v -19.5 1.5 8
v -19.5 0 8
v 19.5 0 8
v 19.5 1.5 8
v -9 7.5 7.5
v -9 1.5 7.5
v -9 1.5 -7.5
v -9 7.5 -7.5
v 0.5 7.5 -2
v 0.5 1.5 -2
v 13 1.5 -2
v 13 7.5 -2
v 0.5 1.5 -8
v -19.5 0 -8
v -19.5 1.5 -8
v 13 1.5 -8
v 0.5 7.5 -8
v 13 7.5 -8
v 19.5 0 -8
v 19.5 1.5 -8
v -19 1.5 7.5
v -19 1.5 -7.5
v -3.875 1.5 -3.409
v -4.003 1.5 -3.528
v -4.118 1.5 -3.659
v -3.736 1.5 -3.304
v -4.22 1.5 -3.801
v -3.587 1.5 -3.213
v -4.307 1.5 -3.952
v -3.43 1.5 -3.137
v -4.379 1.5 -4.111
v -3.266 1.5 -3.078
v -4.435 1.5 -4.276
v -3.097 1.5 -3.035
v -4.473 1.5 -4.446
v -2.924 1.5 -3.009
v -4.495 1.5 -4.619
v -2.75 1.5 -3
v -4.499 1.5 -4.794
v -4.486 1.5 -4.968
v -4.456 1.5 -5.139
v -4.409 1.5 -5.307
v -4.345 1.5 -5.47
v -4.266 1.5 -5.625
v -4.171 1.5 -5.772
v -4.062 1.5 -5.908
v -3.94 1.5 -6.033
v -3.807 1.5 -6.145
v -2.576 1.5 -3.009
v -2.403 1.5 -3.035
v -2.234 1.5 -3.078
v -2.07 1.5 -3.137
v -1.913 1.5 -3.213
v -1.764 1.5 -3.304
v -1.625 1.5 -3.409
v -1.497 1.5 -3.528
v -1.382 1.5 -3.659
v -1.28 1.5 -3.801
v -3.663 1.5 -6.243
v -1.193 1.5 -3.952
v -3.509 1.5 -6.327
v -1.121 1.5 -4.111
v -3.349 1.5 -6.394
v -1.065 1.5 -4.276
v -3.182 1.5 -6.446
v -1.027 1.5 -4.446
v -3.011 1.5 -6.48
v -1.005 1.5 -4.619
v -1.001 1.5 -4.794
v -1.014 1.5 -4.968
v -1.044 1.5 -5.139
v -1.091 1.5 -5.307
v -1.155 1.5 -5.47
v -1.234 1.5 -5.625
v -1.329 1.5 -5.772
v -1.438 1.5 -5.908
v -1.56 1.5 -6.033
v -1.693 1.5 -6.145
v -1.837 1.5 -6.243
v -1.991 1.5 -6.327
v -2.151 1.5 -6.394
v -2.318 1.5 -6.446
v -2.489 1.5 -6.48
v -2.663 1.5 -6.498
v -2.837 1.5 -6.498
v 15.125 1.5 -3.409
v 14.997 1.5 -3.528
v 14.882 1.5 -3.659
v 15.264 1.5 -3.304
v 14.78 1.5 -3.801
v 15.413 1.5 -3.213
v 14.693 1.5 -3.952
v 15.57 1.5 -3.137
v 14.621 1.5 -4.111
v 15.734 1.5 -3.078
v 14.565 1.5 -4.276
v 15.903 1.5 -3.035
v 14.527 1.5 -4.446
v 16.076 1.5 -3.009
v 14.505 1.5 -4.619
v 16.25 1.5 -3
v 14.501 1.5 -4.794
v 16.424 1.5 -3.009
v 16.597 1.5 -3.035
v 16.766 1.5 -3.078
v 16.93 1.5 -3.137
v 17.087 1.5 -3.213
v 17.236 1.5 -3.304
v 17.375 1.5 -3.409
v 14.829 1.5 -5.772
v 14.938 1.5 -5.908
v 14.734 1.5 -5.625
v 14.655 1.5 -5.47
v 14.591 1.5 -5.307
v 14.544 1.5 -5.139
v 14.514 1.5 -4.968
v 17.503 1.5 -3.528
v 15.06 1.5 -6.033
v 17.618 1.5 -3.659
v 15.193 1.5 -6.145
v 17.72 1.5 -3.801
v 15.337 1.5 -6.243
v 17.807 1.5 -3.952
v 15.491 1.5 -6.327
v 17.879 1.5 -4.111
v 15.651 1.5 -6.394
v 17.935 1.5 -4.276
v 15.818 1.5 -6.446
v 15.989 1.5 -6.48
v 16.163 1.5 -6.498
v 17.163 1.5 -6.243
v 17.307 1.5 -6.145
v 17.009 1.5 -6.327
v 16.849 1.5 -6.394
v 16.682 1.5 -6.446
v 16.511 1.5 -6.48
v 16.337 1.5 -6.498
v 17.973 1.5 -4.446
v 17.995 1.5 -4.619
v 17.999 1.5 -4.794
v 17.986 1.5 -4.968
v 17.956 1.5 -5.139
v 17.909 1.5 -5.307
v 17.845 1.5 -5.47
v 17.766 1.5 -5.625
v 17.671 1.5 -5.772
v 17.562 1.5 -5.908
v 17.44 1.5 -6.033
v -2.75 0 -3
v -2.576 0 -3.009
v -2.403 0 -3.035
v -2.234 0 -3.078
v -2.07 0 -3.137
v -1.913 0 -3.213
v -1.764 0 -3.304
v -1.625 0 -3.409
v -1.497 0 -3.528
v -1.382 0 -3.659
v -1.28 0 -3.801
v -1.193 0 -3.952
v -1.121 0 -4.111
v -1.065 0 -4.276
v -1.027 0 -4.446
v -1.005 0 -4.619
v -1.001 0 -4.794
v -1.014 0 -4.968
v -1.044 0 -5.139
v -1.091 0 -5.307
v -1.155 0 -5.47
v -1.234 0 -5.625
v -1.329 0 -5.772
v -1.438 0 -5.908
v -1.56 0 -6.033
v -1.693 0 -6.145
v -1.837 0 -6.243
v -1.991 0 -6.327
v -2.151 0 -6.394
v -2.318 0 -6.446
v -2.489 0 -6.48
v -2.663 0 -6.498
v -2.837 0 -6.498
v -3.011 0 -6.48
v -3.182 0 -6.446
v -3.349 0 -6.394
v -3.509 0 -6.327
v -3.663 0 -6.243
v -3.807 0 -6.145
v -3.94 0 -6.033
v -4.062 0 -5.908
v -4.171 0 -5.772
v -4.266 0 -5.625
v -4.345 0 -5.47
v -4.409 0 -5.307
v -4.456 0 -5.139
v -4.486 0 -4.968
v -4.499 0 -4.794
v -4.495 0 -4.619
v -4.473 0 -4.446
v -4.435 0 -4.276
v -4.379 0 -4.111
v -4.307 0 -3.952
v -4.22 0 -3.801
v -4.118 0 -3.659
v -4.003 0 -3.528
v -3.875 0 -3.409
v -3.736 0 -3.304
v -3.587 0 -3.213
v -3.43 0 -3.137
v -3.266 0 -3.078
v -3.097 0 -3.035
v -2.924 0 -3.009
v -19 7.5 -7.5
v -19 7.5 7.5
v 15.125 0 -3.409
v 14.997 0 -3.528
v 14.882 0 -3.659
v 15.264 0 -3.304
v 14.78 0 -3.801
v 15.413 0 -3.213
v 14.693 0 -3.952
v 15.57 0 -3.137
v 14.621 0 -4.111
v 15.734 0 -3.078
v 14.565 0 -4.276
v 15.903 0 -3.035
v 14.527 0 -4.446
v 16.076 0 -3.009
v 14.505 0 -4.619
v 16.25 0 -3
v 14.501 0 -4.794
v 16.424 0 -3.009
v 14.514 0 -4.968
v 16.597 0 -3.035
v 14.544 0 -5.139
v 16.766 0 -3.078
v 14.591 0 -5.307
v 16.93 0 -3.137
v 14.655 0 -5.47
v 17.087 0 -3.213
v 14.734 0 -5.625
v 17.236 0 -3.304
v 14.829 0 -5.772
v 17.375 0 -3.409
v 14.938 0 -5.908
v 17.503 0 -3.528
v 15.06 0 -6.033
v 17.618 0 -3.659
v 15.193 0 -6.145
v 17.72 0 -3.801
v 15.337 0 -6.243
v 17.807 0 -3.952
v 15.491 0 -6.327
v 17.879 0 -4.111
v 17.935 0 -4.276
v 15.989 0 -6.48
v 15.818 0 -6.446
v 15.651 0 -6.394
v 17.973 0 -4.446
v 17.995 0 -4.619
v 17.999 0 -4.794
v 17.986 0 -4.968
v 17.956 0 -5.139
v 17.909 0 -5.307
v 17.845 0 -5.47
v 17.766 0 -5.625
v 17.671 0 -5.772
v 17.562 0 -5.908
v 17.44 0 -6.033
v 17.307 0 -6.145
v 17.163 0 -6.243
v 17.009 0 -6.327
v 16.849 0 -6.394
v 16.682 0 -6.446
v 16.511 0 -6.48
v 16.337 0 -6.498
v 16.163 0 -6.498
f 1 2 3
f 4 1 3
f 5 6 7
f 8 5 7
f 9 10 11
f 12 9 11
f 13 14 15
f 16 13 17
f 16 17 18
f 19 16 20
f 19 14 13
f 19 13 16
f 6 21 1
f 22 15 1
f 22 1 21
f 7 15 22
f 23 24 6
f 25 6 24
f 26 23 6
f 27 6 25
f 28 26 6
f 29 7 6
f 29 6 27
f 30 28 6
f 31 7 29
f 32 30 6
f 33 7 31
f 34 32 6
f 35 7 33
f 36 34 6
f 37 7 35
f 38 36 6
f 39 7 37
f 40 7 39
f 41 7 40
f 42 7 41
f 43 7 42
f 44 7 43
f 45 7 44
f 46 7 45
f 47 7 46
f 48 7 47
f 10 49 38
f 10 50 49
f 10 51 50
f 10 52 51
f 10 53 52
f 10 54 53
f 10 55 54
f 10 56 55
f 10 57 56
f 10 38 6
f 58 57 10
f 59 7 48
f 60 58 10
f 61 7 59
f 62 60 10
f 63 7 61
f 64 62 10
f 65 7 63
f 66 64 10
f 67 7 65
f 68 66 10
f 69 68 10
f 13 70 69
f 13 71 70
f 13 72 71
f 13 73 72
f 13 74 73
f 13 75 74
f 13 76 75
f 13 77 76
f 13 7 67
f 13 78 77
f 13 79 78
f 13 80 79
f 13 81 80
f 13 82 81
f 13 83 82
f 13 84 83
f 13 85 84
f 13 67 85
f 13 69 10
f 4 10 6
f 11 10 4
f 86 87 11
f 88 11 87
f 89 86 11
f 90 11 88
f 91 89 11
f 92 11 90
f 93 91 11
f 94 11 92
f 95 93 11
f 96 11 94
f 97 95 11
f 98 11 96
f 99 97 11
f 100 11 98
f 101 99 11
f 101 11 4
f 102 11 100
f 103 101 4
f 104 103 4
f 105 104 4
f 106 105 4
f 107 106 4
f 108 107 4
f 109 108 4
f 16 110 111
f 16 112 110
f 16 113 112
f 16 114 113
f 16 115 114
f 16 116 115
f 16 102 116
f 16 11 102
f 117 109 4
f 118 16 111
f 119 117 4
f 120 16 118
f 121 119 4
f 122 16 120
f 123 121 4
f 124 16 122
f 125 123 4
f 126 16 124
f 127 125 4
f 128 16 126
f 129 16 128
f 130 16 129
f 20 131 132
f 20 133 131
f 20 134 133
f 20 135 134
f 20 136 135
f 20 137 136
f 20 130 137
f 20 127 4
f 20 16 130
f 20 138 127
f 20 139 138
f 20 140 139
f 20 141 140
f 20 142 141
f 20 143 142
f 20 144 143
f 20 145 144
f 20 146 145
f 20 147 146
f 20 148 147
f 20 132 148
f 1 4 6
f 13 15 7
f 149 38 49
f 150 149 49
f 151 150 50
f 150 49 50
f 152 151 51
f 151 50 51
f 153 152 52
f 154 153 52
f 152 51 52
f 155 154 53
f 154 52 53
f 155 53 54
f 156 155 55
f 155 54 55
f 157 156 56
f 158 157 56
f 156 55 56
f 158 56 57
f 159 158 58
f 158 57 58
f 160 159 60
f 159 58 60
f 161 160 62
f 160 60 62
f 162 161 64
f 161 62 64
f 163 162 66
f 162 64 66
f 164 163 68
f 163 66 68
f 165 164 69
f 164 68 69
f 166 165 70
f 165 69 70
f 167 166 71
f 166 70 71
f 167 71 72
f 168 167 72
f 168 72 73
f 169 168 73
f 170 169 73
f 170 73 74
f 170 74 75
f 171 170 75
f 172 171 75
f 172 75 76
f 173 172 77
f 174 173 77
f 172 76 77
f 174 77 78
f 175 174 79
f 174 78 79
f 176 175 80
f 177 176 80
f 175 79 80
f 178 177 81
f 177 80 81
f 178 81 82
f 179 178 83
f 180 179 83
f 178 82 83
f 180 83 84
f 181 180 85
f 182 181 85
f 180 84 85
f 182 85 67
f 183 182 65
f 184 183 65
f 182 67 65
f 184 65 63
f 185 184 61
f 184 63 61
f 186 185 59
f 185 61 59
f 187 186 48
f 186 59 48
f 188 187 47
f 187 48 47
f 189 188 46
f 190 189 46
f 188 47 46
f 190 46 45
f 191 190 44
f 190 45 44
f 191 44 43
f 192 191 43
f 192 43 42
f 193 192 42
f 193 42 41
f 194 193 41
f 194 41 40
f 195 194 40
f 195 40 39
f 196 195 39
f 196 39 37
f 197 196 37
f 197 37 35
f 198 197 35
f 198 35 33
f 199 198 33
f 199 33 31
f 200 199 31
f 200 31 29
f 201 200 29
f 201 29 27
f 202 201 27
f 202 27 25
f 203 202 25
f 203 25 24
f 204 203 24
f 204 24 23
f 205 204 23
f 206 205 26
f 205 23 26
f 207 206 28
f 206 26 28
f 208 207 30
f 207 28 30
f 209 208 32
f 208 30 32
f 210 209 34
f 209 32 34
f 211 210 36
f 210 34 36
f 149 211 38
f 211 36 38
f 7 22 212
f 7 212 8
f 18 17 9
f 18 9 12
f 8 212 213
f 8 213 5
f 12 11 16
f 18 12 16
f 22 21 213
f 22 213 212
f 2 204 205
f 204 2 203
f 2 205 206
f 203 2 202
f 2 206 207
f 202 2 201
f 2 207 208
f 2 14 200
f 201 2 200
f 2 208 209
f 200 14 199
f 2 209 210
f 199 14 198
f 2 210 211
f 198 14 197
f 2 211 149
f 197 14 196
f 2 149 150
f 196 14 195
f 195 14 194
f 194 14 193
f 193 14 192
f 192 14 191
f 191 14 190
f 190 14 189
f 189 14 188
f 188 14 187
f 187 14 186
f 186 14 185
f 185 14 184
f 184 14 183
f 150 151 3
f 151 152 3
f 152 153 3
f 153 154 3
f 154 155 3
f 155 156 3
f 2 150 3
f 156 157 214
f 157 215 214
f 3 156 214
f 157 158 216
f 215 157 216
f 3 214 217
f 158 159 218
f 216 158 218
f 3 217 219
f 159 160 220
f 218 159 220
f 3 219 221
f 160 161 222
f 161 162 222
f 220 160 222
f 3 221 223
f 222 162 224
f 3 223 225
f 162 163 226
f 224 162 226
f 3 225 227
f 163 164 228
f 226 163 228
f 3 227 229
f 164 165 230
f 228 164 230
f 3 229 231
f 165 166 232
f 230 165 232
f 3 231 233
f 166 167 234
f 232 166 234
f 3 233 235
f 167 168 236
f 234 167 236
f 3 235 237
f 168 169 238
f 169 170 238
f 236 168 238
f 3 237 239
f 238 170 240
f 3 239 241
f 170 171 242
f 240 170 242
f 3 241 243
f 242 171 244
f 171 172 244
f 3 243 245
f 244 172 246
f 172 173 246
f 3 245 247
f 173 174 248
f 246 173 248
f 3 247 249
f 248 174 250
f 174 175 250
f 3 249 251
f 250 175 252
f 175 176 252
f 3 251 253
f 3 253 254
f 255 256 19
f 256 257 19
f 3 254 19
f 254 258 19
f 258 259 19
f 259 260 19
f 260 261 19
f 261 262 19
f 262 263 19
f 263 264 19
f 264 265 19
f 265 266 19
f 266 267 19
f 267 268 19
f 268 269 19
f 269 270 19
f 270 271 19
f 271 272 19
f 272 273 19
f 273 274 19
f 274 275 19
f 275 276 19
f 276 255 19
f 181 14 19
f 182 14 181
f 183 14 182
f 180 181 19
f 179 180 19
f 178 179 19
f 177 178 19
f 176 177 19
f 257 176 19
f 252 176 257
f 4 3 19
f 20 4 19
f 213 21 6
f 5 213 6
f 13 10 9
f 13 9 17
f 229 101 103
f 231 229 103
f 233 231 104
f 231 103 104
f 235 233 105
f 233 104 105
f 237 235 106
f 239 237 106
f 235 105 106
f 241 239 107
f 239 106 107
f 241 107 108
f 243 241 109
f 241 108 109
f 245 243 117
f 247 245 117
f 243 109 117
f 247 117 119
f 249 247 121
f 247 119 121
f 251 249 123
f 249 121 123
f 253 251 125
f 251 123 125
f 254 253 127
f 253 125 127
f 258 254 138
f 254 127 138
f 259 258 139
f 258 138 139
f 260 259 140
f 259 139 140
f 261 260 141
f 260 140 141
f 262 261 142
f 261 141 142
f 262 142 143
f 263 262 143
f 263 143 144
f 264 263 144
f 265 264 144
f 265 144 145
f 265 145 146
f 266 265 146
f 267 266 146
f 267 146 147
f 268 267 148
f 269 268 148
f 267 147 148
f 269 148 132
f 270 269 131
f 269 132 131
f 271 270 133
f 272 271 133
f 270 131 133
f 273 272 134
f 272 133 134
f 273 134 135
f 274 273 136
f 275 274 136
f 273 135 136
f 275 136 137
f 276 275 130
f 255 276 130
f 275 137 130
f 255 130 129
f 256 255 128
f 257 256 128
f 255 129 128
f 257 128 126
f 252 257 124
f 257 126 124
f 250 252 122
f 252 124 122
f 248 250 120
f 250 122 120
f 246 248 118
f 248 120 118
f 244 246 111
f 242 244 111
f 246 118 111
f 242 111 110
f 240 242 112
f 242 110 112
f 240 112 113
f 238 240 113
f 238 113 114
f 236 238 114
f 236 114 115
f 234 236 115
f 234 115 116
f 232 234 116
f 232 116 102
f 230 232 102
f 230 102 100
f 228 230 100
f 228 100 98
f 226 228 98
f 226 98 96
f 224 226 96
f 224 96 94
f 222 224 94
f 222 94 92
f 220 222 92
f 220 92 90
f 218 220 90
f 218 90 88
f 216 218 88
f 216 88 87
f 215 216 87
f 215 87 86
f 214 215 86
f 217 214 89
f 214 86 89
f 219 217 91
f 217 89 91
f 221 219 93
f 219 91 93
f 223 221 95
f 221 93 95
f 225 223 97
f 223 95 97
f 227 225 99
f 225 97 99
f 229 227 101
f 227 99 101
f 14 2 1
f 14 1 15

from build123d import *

# Parameters (mm, degrees)
SKETCH_1_W          = 39
SKETCH_1_H          = 16
EXTRUDE_1_DEPTH     = 1.5
SKETCH_2_R          = 1.75
CUT_EXTRUDE_1_DEPTH = 1.5
SKETCH_3_W          = 12.5
SKETCH_3_H          = 6
EXTRUDE_2_DEPTH     = 6
SKETCH_4_W          = 10
SKETCH_4_H          = 15
EXTRUDE_3_DEPTH     = 6


with BuildPart() as part:
    # 草图1 → 凸台-拉伸1 (new body)
    with BuildSketch(Plane(origin=(0, 0, 0), x_dir=(1, 0, 0), z_dir=(0, 1, 0))):
        Rectangle(SKETCH_1_W, SKETCH_1_H)
    extrude(amount=EXTRUDE_1_DEPTH)

    # 草图2 → 切除-拉伸1 (cut)
    with BuildSketch(Plane(origin=(0, 1.5, 0), x_dir=(1, 0, 0), z_dir=(0, 1, 0))):
        with Locations(Location((16.25, 4.75, 0), (0, 0, 270))):
            Circle(SKETCH_2_R)
        with Locations(Location((-2.75, 4.75, 0), (0, 0, 270))):
            Circle(SKETCH_2_R)
    extrude(amount=-CUT_EXTRUDE_1_DEPTH, mode=Mode.SUBTRACT)

    # 草图3 → 凸台-拉伸2 (add)
    with BuildSketch(Plane(origin=(0, 1.5, 0), x_dir=(1, 0, 0), z_dir=(0, 1, 0))):
        with Locations((6.75, 5)):
            Rectangle(SKETCH_3_W, SKETCH_3_H)
    extrude(amount=EXTRUDE_2_DEPTH)

    # 草图4 → 凸台-拉伸3 (add)
    with BuildSketch(Plane(origin=(0, 1.5, 0), x_dir=(1, 0, 0), z_dir=(0, 1, 0))):
        with Locations((-14, 0)):
            Rectangle(SKETCH_4_W, SKETCH_4_H)
    extrude(amount=EXTRUDE_3_DEPTH)


solid = part.part
